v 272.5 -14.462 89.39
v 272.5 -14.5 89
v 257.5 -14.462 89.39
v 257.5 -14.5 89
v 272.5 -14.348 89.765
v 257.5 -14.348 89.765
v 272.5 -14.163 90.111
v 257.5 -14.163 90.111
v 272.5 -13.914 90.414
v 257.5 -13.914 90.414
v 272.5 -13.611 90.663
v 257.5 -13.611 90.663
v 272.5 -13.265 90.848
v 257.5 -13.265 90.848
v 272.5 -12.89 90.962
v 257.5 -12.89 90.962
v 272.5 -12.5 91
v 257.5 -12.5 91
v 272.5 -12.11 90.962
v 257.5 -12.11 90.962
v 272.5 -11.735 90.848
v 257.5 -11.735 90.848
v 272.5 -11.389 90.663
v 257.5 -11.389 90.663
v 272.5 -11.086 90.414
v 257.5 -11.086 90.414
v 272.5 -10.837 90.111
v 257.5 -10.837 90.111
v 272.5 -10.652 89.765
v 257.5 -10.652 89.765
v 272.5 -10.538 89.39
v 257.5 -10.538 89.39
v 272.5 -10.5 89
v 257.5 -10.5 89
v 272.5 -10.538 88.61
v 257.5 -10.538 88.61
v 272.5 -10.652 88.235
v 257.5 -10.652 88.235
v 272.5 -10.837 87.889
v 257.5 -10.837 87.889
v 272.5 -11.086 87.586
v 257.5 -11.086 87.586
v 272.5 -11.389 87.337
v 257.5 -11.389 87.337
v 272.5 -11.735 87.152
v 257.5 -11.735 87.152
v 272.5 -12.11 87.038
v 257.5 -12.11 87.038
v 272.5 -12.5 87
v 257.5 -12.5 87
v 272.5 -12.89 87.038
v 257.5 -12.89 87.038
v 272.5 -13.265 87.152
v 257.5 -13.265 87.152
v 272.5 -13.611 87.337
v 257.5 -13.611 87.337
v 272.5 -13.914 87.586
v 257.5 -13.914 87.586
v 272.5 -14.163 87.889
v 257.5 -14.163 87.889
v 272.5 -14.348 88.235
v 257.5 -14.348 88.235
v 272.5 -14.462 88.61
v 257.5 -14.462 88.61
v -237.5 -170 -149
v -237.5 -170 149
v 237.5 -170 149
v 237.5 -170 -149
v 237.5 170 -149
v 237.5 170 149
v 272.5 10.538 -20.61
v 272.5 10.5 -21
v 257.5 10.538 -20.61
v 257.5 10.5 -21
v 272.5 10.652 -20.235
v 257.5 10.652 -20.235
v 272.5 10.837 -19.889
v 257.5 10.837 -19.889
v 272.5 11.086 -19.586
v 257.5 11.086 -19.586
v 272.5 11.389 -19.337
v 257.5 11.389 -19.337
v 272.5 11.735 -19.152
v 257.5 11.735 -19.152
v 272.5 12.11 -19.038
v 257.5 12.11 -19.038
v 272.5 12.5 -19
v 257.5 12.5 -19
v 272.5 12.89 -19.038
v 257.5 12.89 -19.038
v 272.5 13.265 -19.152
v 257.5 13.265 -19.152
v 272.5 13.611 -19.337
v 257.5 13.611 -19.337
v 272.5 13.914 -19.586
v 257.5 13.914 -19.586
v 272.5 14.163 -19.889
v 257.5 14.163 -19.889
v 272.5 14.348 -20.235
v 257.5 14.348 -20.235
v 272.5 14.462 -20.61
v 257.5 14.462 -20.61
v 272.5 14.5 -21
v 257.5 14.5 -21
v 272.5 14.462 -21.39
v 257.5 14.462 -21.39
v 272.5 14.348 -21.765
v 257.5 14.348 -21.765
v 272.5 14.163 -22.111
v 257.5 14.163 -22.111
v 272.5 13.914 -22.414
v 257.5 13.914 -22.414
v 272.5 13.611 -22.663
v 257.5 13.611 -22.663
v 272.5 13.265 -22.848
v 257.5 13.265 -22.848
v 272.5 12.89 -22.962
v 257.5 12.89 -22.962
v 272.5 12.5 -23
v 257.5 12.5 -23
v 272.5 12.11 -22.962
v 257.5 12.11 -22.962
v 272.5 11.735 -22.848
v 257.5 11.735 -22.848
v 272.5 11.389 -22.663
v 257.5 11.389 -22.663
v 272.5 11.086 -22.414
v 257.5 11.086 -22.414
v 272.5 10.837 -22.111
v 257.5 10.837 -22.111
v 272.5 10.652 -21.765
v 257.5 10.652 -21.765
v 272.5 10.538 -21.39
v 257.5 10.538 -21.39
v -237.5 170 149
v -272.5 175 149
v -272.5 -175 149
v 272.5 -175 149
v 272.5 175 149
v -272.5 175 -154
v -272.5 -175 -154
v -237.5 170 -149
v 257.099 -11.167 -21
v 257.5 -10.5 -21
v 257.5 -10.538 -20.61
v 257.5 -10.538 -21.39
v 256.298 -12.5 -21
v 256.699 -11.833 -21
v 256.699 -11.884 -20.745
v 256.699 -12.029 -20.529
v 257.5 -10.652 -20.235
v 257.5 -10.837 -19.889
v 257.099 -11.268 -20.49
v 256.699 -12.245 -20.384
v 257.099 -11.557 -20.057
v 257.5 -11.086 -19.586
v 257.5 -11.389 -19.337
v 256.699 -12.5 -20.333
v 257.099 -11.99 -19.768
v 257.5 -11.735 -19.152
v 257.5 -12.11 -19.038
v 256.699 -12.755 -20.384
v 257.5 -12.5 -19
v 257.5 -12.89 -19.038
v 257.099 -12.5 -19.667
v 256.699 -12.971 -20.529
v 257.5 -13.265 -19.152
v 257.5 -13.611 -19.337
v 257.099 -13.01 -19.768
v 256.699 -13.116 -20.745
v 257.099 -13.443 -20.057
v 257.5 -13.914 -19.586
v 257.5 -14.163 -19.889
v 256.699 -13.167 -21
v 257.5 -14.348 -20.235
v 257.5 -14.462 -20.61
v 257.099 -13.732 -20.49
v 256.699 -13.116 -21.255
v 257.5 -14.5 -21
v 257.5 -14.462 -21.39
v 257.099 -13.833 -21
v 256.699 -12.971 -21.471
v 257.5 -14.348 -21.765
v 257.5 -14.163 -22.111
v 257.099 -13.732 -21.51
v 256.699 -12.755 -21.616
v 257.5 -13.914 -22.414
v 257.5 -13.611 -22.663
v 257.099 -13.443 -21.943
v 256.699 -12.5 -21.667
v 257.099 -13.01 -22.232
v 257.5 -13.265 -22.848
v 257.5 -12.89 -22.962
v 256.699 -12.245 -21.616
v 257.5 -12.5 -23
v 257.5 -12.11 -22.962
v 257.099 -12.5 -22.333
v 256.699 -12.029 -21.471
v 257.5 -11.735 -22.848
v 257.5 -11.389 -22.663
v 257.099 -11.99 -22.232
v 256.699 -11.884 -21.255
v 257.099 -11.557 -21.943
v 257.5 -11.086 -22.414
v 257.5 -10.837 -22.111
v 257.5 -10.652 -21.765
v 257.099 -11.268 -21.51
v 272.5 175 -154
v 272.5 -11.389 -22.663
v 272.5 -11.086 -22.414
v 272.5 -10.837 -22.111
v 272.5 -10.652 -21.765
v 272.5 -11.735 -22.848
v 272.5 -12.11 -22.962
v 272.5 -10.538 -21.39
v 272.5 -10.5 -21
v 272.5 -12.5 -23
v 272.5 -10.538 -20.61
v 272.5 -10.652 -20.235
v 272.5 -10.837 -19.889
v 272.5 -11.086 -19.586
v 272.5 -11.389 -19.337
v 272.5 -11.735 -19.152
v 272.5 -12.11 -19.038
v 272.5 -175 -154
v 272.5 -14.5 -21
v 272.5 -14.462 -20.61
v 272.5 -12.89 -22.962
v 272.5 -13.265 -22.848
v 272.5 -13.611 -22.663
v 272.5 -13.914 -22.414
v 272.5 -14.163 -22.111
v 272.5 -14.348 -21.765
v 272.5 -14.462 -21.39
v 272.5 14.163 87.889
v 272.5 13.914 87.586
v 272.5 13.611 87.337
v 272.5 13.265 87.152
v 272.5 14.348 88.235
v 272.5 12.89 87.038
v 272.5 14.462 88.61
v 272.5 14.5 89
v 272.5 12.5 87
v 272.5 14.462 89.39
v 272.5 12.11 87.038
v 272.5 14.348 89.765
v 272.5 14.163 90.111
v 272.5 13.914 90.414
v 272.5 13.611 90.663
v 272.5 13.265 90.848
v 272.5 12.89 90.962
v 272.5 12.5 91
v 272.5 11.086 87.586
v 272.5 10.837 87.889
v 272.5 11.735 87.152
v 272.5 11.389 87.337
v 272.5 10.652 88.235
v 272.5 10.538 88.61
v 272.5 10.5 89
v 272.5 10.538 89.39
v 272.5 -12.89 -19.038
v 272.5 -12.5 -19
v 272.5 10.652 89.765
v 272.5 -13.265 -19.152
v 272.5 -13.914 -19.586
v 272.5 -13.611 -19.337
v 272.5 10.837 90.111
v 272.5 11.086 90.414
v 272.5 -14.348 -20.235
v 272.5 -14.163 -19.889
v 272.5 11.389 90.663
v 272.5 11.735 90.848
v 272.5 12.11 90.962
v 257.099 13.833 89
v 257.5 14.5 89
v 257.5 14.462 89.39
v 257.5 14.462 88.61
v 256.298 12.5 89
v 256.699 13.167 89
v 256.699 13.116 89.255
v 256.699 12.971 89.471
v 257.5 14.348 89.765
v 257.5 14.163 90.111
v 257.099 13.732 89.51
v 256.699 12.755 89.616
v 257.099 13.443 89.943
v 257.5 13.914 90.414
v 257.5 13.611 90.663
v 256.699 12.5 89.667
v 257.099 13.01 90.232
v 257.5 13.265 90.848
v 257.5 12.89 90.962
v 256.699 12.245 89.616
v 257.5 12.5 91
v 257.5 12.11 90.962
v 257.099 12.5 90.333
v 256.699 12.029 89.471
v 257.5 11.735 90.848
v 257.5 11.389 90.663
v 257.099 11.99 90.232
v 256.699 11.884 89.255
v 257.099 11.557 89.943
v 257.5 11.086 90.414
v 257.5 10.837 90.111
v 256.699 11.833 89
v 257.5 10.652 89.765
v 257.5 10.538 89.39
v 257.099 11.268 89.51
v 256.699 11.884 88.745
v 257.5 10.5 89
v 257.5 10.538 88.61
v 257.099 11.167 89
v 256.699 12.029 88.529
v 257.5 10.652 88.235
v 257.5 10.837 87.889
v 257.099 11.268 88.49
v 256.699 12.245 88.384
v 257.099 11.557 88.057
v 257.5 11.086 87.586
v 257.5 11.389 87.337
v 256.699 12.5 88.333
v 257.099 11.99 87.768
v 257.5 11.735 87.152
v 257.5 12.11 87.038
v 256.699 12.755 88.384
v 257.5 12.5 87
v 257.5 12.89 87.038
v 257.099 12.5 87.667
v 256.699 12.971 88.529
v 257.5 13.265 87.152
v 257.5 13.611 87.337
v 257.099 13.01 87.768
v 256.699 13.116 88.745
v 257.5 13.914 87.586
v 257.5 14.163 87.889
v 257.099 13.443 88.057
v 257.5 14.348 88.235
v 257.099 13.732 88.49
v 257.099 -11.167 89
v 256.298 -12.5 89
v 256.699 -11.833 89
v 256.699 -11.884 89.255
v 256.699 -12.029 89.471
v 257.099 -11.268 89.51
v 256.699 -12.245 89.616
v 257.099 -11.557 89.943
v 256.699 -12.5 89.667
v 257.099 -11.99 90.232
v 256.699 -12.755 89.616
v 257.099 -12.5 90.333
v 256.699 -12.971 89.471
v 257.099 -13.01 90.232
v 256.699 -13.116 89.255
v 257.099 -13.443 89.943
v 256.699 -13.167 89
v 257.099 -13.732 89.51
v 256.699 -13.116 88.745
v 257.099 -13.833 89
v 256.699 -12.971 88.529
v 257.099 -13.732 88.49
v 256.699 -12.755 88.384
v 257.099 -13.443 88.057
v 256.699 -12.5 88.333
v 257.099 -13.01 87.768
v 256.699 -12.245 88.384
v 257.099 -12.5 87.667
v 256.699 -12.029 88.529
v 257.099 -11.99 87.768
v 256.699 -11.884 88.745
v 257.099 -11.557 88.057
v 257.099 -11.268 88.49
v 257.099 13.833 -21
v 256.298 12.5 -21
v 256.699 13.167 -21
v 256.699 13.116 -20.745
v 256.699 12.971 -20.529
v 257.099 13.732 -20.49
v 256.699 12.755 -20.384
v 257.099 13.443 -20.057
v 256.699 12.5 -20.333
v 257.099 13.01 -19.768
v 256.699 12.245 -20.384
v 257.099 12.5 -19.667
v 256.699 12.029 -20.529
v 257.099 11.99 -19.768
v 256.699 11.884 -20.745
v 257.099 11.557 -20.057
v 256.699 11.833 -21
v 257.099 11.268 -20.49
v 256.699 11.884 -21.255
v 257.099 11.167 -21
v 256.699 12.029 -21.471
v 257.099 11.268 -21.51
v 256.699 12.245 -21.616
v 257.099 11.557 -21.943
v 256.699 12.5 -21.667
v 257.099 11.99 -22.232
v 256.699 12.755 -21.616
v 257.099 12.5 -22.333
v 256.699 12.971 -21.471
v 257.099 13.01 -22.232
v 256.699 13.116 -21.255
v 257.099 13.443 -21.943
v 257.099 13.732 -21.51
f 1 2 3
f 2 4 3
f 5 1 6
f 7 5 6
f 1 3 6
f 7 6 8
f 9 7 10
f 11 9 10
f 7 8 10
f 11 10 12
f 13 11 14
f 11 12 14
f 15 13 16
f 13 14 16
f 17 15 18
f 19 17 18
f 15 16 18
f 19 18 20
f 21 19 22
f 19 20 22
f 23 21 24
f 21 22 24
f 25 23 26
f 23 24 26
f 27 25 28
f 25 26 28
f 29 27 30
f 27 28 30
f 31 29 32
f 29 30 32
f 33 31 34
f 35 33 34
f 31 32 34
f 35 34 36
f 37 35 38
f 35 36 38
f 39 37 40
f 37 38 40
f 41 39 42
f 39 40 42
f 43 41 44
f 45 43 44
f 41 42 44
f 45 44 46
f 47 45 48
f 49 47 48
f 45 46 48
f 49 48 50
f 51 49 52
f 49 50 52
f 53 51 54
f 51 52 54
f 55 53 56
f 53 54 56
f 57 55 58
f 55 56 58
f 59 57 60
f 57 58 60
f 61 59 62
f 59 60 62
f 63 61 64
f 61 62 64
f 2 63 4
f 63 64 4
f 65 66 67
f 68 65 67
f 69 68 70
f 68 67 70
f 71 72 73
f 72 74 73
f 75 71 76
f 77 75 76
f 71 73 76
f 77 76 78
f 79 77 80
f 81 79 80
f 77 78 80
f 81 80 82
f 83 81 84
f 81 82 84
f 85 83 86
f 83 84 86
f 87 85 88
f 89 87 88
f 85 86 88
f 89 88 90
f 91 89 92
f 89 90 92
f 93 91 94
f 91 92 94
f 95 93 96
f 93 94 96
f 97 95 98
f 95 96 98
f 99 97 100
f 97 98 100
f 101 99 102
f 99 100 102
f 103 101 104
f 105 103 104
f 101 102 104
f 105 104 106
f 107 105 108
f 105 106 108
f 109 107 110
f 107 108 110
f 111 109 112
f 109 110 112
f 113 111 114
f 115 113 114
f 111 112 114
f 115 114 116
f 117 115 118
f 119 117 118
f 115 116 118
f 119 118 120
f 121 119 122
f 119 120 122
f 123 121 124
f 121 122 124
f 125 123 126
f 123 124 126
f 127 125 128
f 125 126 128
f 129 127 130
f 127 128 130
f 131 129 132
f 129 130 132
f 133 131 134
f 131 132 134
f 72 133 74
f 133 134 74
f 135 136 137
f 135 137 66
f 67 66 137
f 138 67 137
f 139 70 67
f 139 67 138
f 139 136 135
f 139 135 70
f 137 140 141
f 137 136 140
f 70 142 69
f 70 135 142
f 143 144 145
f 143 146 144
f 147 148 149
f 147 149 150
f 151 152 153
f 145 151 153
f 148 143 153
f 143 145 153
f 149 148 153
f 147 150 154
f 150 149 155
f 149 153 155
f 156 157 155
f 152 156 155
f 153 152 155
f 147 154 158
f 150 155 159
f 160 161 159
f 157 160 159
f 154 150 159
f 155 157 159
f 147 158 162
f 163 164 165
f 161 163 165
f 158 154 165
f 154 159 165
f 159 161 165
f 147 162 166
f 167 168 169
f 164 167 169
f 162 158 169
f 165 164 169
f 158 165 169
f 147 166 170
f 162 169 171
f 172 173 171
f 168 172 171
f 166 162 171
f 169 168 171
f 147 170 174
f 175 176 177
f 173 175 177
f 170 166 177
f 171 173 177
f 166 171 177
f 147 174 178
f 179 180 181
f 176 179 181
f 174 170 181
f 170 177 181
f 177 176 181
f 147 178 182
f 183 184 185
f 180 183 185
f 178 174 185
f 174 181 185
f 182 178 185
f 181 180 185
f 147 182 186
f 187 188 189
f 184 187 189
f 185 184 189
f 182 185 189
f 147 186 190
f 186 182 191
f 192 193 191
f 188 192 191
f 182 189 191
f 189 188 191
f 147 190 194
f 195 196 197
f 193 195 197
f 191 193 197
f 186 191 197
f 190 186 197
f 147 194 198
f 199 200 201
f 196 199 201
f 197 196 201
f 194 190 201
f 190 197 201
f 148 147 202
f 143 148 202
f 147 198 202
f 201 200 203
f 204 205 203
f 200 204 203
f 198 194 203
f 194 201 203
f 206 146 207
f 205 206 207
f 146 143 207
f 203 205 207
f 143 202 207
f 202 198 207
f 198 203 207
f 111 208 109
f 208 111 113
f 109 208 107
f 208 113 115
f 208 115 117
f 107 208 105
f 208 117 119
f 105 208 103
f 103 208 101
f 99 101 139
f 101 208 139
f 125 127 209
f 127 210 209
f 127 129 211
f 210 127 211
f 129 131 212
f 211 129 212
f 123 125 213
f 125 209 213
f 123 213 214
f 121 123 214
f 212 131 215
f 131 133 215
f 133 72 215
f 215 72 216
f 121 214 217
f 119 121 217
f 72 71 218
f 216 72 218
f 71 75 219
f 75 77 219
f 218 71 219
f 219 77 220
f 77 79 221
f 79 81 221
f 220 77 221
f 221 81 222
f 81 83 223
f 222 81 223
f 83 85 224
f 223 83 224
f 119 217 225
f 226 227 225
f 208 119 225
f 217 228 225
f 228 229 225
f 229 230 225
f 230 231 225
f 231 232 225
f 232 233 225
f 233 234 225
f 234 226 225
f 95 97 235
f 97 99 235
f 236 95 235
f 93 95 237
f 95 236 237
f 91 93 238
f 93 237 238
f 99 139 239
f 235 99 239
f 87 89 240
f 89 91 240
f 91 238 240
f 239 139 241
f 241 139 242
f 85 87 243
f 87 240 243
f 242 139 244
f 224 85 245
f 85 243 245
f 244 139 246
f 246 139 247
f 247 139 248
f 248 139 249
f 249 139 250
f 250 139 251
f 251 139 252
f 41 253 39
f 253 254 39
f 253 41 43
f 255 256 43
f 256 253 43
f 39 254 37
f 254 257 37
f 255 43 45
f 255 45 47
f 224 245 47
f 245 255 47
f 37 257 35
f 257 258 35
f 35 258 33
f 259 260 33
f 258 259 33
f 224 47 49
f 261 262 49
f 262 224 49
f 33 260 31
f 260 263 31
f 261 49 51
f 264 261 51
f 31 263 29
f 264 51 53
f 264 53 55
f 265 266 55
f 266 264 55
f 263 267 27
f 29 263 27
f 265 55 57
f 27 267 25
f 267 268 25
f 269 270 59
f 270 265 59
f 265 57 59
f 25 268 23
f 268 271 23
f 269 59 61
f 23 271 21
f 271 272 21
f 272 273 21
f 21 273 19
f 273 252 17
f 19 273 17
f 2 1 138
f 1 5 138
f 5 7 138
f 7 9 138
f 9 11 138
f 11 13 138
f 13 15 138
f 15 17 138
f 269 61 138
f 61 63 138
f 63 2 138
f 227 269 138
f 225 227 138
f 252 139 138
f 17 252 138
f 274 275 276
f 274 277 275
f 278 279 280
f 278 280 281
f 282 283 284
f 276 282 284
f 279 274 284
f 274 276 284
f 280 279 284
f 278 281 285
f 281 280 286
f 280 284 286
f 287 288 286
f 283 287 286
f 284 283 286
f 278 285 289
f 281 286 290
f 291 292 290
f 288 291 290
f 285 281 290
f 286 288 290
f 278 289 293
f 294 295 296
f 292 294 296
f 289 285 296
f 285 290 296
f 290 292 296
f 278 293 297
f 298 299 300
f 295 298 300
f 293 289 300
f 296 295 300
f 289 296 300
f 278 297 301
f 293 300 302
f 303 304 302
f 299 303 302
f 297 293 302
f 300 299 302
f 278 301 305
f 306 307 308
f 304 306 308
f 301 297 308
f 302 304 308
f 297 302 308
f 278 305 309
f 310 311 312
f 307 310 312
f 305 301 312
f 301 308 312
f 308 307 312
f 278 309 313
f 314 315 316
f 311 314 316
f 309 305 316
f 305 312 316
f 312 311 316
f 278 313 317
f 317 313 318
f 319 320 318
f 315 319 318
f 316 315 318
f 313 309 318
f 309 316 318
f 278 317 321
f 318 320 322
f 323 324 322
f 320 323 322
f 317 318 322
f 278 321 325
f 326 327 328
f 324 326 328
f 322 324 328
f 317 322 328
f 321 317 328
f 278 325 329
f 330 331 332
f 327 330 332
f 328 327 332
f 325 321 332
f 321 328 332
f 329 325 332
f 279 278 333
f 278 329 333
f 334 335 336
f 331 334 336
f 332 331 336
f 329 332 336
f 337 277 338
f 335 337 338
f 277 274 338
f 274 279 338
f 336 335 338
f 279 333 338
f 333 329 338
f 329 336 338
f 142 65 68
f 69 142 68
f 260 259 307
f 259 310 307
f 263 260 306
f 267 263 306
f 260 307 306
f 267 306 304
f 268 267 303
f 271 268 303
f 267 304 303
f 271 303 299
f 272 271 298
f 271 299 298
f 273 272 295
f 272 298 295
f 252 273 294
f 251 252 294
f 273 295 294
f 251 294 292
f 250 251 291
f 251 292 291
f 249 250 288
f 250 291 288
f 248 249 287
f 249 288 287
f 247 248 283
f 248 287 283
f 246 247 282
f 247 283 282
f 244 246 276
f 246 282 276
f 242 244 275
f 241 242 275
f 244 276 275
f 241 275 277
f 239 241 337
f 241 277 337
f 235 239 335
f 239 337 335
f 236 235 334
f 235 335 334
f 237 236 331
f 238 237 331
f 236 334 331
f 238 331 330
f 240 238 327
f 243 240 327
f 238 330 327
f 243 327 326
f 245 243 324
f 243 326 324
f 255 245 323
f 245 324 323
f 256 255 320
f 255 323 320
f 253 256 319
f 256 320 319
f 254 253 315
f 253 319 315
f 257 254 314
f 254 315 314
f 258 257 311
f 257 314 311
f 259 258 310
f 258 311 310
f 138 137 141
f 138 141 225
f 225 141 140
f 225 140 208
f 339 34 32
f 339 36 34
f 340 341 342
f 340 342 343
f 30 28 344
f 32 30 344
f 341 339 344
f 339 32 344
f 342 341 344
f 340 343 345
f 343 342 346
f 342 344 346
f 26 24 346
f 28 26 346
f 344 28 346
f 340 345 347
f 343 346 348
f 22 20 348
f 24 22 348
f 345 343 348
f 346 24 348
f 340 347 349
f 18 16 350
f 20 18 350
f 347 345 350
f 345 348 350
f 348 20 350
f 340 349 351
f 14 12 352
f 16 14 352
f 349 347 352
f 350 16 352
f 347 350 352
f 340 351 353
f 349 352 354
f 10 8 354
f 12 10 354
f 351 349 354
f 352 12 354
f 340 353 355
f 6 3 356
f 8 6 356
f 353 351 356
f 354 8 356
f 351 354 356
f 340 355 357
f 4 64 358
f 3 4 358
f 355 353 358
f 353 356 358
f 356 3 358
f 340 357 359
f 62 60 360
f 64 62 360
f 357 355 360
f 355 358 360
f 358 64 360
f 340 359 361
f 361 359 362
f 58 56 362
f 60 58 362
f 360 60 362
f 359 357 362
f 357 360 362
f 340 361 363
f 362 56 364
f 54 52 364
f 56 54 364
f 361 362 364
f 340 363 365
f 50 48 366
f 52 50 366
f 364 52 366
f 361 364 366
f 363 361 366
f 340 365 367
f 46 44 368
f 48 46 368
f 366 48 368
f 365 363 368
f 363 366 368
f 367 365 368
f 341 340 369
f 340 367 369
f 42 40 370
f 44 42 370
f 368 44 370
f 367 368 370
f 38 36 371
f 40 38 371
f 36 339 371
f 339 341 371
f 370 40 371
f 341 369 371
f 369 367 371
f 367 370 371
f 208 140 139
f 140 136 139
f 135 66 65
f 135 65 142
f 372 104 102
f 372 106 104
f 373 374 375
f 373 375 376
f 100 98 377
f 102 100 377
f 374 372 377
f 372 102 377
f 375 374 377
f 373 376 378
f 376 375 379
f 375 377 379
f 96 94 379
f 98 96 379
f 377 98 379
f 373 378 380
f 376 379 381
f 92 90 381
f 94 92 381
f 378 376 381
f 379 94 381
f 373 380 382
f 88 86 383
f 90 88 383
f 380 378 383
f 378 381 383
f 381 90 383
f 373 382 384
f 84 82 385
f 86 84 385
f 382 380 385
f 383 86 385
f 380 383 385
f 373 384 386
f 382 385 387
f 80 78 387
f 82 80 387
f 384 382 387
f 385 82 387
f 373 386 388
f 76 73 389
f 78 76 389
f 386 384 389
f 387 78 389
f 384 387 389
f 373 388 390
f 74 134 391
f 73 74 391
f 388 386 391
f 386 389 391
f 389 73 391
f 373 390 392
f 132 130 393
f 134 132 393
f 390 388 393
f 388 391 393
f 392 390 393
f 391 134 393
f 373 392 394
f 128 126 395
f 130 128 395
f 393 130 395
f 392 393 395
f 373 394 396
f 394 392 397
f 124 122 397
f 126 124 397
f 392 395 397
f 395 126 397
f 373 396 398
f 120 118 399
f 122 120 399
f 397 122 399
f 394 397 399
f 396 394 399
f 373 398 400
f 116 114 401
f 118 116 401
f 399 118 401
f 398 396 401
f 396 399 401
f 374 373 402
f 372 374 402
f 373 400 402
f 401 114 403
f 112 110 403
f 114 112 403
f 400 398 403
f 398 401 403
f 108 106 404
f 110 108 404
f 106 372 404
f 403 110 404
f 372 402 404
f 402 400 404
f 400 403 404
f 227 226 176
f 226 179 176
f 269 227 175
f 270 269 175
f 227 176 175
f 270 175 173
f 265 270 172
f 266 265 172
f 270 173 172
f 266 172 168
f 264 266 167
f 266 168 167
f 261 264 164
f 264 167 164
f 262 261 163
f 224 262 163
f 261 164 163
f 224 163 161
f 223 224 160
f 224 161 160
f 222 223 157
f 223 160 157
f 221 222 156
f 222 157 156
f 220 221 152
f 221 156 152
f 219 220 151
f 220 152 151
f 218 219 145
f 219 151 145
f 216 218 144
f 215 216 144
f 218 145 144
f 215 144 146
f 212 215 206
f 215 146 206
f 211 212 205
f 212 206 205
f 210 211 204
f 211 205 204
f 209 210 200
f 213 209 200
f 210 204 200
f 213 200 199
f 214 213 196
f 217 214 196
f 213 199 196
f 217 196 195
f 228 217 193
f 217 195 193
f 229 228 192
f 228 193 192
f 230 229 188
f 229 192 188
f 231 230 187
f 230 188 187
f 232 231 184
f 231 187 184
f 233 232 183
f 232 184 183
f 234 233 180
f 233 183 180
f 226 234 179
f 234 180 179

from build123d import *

# Parameters (mm, degrees)
F0_W     = 545
F0_H     = 350
F0_W_2   = 475
F0_H_2   = 340
F1_DEPTH = 149
F3_W     = 545
F3_H     = 350
F4_DEPTH = 5
F5_D     = 4
F5_DEPTH = 15
F5_TIP   = 1.2017212381


with BuildPart() as f1:
    # F0 (on Top) → F1 (new body, symmetric)
    with BuildSketch(Plane.XY):
        Rectangle(F0_W, F0_H)
        Rectangle(F0_W_2, F0_H_2, mode=Mode.SUBTRACT)
    extrude(amount=F1_DEPTH, both=True)

    # F3 (on face) → F4 (join)
    with BuildSketch(Plane(origin=(0, 0, -149), x_dir=(1, 0, 0), z_dir=(0, 0, -1))):
        Rectangle(F3_W, F3_H)
    extrude(amount=F4_DEPTH)

    # F5
    with Locations(Plane.YZ.offset(272.5)):
        with Locations((-12.5, 89), (12.5, 89), (-12.5, -21), (12.5, -21)):
            Hole(F5_D / 2, depth=F5_DEPTH)
            with Locations((0, 0, -(F5_DEPTH + F5_TIP / 2))):  # 118° drill point
                Cone(0, F5_D / 2, F5_TIP, mode=Mode.SUBTRACT)


solid = f1.part
